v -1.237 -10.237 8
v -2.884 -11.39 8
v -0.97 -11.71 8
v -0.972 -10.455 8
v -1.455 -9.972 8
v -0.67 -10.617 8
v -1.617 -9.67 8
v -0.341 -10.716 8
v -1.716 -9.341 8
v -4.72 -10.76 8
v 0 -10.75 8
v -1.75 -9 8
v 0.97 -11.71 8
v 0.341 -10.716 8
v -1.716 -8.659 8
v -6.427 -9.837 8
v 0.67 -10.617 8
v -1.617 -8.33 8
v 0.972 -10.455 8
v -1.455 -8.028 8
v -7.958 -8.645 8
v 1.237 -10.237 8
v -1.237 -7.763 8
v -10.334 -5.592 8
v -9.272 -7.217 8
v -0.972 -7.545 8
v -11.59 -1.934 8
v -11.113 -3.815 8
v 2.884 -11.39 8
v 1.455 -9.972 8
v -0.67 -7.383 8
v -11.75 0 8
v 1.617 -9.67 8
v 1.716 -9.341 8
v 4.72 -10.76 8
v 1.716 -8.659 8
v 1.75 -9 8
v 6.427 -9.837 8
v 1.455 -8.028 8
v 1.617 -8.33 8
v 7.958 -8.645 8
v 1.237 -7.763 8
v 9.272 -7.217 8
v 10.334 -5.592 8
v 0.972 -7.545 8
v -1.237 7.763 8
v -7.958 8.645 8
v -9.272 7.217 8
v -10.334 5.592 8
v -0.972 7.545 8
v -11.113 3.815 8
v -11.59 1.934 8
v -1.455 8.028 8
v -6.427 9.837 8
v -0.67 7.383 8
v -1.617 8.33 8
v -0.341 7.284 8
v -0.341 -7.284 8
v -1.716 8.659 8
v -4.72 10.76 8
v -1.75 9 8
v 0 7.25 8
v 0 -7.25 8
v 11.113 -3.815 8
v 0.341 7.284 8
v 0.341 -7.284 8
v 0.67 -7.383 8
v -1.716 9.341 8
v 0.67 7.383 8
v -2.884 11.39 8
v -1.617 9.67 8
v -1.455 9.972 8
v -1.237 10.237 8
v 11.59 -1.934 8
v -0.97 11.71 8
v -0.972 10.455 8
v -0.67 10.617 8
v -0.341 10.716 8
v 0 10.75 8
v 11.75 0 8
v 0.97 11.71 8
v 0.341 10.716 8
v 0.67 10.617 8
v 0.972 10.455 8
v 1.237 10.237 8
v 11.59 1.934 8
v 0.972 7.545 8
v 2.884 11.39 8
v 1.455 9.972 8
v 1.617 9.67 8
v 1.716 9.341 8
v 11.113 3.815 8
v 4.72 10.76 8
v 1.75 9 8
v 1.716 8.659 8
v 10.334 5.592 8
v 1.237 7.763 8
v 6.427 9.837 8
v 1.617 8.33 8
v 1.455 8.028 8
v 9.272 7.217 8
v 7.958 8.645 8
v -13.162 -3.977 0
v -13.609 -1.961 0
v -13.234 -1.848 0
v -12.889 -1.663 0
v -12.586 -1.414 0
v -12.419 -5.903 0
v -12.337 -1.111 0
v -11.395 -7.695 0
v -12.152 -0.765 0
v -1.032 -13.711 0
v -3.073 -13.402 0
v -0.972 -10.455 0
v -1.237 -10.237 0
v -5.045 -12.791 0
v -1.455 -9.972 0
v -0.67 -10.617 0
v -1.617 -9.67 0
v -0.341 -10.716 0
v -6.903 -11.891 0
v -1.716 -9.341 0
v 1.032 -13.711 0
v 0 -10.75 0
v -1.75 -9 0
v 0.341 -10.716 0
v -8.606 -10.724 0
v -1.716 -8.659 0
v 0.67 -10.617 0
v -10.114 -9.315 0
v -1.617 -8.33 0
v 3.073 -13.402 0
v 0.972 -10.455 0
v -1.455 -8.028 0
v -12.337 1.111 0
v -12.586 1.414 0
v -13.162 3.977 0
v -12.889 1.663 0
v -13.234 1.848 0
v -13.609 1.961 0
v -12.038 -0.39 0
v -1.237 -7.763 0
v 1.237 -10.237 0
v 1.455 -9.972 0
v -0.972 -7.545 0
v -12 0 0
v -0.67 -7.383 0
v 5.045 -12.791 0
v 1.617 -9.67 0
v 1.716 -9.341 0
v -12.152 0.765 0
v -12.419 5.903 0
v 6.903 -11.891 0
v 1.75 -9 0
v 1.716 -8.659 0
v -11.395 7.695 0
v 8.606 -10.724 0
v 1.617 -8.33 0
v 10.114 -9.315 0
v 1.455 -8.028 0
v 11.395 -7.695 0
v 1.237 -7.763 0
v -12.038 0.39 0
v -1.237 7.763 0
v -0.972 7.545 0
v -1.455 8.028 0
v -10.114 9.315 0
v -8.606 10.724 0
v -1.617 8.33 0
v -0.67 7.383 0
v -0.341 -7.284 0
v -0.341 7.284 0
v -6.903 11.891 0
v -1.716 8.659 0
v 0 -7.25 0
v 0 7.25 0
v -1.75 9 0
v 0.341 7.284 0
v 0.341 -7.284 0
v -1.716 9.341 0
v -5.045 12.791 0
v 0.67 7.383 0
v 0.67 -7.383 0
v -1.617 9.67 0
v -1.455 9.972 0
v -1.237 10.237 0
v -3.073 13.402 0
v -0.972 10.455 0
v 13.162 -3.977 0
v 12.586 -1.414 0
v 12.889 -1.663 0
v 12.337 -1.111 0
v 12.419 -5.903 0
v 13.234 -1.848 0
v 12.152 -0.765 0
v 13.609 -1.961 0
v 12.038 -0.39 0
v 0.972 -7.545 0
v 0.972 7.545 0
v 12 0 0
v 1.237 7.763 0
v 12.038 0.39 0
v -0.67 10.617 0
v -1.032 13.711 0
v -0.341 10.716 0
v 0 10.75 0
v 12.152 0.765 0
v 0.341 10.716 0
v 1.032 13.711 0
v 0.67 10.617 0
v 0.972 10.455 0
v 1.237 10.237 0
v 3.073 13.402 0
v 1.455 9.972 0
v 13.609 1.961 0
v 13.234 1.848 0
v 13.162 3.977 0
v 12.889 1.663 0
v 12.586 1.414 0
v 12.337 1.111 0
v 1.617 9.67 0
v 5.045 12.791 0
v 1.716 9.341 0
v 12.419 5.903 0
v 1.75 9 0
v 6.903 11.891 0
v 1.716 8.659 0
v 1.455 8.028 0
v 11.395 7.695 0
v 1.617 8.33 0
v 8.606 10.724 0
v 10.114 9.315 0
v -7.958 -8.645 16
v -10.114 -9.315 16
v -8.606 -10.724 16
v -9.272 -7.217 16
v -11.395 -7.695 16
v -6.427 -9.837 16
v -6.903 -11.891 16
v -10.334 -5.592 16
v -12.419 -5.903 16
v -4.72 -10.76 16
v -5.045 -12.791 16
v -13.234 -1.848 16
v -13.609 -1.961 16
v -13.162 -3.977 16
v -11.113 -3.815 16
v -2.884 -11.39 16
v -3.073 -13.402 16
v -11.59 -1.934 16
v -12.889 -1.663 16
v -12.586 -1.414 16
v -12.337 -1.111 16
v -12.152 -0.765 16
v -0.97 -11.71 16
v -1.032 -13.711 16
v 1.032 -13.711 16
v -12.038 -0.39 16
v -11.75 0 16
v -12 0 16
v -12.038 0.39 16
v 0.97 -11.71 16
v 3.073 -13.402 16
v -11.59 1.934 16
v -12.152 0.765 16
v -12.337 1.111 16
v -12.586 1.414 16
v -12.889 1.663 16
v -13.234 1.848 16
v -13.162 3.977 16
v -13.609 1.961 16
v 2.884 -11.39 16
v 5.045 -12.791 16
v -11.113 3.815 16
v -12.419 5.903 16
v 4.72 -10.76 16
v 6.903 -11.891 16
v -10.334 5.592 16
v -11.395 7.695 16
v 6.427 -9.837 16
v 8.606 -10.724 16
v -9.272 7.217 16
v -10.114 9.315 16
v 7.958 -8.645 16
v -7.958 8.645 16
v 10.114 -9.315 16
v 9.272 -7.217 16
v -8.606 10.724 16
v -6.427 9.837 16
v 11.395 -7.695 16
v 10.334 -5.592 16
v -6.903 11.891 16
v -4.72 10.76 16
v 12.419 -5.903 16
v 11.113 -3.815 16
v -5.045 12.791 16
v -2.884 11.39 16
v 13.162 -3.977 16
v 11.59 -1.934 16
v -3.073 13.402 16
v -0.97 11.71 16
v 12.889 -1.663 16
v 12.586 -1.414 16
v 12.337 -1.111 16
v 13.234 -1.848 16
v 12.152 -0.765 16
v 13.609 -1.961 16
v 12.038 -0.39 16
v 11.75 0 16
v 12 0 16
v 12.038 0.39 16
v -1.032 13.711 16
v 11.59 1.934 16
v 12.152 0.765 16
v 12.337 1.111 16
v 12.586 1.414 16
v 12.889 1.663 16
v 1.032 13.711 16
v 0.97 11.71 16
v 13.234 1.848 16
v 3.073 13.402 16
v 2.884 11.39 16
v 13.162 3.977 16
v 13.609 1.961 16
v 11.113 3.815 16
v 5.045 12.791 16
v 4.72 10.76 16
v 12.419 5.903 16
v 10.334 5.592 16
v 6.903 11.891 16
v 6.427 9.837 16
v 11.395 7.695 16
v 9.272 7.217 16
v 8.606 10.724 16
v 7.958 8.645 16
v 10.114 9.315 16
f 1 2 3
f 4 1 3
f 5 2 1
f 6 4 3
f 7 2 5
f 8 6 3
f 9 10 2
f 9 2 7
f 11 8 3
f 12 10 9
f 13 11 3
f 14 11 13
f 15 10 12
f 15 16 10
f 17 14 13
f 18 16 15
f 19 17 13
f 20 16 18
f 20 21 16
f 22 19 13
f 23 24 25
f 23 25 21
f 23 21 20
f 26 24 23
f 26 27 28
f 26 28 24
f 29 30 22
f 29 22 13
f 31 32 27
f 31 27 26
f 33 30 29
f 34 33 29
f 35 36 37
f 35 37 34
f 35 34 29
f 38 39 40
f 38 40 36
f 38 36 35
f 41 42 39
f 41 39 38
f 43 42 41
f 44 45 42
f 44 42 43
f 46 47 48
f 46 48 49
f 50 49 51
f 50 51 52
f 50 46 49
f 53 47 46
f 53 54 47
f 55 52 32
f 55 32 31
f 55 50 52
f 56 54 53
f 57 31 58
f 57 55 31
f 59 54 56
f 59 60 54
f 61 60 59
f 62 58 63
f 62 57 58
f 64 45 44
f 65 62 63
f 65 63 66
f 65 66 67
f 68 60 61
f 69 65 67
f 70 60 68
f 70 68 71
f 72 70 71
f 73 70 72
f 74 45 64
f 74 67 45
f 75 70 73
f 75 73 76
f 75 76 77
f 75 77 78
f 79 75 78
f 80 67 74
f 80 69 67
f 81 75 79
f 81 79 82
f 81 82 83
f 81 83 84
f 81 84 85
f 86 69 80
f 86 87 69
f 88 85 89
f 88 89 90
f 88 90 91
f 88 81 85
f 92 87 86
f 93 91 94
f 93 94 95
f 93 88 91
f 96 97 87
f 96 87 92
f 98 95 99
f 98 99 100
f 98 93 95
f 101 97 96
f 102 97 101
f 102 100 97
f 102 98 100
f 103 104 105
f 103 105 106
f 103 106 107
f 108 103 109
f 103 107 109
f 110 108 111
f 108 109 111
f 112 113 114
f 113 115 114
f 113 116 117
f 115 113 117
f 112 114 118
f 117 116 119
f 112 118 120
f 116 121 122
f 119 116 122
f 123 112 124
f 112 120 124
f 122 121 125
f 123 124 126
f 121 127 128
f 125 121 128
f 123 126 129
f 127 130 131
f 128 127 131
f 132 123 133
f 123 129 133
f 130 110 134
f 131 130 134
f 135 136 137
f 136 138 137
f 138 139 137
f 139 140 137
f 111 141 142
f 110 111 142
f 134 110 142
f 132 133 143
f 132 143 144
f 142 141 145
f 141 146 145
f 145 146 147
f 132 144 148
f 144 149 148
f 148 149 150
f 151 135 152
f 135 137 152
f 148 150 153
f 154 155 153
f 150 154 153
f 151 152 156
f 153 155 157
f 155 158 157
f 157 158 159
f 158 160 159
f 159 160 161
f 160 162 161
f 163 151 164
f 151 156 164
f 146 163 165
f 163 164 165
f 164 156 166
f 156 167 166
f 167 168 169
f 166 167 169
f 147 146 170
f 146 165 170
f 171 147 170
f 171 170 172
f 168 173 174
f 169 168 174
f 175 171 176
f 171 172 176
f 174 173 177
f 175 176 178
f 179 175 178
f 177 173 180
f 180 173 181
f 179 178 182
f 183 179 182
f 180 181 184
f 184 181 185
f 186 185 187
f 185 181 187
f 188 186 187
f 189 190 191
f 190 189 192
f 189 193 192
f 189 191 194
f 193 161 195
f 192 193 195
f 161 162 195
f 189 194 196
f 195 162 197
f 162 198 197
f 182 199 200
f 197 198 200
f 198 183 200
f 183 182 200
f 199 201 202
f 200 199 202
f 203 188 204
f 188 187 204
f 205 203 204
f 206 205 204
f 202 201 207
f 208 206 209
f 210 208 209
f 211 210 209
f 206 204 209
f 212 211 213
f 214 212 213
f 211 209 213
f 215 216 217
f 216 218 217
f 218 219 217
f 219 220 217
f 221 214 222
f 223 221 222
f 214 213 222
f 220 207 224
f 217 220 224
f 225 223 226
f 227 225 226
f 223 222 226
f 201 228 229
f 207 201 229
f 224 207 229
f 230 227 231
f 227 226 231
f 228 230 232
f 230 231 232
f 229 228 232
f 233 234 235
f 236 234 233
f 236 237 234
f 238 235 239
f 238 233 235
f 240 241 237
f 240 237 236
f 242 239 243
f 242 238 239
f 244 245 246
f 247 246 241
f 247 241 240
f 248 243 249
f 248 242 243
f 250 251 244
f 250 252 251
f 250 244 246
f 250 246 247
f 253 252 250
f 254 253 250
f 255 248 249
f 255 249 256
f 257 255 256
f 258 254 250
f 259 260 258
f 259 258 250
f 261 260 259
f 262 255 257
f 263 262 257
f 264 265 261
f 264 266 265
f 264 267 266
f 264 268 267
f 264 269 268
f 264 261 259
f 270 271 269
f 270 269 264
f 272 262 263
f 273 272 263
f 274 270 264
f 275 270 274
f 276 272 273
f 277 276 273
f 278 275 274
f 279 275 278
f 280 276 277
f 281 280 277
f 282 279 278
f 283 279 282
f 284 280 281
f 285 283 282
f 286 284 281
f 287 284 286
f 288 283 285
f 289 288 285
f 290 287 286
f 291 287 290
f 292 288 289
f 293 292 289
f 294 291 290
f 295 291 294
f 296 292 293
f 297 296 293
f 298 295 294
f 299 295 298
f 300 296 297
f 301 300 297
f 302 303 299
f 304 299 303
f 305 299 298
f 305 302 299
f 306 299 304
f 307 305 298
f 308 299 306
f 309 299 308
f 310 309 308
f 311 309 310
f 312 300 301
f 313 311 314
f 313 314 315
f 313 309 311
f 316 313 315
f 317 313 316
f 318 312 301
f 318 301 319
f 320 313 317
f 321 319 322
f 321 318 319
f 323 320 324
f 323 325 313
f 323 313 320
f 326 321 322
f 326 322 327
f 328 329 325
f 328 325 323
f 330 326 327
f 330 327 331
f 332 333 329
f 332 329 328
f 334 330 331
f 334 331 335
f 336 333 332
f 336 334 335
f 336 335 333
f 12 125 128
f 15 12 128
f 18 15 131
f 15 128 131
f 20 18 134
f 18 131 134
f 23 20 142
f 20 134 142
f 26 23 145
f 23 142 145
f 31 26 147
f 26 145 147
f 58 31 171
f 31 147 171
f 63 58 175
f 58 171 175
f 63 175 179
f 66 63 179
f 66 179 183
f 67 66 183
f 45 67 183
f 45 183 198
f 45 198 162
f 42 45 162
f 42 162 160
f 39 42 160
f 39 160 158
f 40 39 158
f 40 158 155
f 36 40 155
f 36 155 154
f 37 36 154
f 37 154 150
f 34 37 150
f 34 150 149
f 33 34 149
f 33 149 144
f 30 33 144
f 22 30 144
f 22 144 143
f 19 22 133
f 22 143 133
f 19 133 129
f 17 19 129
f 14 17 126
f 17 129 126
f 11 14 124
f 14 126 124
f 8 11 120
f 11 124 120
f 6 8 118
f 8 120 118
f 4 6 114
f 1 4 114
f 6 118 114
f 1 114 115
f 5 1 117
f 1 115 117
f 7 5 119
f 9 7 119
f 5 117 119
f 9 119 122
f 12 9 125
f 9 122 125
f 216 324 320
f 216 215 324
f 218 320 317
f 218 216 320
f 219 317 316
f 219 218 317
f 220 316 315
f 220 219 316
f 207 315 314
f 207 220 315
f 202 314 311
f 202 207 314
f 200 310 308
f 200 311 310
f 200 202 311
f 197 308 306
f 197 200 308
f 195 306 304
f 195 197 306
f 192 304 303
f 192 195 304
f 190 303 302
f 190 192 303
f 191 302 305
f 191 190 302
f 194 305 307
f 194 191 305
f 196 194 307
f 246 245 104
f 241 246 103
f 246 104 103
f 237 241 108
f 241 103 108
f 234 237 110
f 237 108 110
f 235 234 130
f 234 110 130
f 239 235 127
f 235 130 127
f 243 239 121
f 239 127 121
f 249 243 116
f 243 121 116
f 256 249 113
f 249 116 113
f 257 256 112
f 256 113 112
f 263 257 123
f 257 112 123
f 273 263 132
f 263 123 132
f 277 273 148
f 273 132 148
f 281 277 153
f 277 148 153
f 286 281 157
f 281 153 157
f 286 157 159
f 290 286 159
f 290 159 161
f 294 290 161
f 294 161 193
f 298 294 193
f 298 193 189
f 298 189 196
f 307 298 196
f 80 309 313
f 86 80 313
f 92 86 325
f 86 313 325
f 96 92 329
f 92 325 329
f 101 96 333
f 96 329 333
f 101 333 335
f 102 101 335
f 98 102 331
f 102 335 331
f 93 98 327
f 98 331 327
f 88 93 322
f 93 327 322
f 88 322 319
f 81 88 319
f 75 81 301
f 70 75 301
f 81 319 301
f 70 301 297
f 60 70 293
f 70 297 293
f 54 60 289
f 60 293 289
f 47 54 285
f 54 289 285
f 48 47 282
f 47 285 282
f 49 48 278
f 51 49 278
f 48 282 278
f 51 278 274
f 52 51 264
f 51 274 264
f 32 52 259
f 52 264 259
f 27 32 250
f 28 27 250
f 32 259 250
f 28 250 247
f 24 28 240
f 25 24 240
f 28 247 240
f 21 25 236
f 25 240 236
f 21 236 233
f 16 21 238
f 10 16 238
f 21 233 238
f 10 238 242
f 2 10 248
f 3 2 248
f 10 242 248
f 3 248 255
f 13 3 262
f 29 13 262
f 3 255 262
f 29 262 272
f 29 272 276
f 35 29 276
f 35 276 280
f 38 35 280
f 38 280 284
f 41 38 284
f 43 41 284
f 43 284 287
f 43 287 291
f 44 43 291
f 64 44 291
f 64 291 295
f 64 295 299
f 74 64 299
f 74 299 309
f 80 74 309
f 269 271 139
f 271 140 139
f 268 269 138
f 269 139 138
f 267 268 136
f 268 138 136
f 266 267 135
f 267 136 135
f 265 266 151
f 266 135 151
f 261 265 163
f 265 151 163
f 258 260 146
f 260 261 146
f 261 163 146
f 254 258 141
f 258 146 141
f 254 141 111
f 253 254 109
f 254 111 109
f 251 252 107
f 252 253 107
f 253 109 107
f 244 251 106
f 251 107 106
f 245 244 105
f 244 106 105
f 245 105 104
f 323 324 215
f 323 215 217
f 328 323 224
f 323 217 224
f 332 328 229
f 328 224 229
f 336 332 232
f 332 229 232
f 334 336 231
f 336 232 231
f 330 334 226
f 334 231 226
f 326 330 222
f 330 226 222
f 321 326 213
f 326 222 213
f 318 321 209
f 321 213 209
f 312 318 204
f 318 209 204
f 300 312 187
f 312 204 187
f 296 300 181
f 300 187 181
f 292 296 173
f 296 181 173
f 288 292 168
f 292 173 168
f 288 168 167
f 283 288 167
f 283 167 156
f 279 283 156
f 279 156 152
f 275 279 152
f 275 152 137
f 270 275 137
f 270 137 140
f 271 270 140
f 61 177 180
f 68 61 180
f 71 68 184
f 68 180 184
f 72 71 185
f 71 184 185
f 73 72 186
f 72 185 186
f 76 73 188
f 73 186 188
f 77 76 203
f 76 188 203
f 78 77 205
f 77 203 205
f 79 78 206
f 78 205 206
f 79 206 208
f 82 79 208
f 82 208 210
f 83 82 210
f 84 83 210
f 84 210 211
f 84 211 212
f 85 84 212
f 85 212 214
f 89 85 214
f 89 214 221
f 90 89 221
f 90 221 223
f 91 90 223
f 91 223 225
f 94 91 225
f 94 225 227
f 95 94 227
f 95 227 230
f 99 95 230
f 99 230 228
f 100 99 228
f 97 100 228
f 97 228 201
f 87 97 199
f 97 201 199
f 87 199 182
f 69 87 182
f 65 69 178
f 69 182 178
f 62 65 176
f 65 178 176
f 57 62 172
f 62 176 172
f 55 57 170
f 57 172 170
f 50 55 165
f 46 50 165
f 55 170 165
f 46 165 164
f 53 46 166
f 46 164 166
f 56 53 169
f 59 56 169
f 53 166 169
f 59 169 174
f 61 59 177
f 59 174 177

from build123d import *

# Parameters (mm, degrees)
SKETCH1_R           = 13.75
BOSS_EXTRUDE1_DEPTH = 16
SKETCH2_R           = 11.75
CUT_EXTRUDE1_DEPTH  = 8
SKETCH3_R           = 1.75
CUT_EXTRUDE2_DEPTH  = 26.181838694
SKETCH4_R           = 2
CUT_EXTRUDE4_DEPTH  = 26.181838694


with BuildPart() as part:
    # Sketch1 → Boss-Extrude1 (new body)
    with BuildSketch(Plane(origin=(0, 0, 0), x_dir=(0, 1, 0), z_dir=(0, 0, 1))):
        with Locations(Location((0, 0, 0), (0, 0, 270))):
            Circle(SKETCH1_R)
    extrude(amount=BOSS_EXTRUDE1_DEPTH)

    # Sketch2 → Cut-Extrude1 (cut)
    with BuildSketch(Plane(origin=(0, 0, 16), x_dir=(0, -1, 0), z_dir=(0, 0, 1))):
        with Locations(Location((0, 0, 0), (0, 0, 90))):
            Circle(SKETCH2_R)
    extrude(amount=-CUT_EXTRUDE1_DEPTH, mode=Mode.SUBTRACT)

    # Sketch3 → Cut-Extrude2 (cut, through all)
    with BuildSketch(Plane(origin=(0, 0, 0), x_dir=(1, 0, 0), z_dir=(0, 0, -1))):
        with Locations(Location((0, 9, 0), (0, 0, 180))):
            Circle(SKETCH3_R)
        with Locations(Location((0, -9, 0), (0, 0, 180))):
            Circle(SKETCH3_R)
    extrude(amount=-CUT_EXTRUDE2_DEPTH, mode=Mode.SUBTRACT)

    # Sketch4 → Cut-Extrude4 (cut, through all)
    with BuildSketch(Plane(origin=(0, 0, 0), x_dir=(1, 0, 0), z_dir=(0, 0, -1))):
        with Locations((-14, 0)):
            Circle(SKETCH4_R)
    cut_extrude4 = extrude(amount=-CUT_EXTRUDE4_DEPTH, mode=Mode.SUBTRACT)

    # Mirror1: Cut-Extrude4 across plane
    add(cut_extrude4.mirror(Plane(origin=(0, 0, 0), x_dir=(0, 0, 1), z_dir=(1, 0, 0))), mode=Mode.SUBTRACT)


solid = part.part
